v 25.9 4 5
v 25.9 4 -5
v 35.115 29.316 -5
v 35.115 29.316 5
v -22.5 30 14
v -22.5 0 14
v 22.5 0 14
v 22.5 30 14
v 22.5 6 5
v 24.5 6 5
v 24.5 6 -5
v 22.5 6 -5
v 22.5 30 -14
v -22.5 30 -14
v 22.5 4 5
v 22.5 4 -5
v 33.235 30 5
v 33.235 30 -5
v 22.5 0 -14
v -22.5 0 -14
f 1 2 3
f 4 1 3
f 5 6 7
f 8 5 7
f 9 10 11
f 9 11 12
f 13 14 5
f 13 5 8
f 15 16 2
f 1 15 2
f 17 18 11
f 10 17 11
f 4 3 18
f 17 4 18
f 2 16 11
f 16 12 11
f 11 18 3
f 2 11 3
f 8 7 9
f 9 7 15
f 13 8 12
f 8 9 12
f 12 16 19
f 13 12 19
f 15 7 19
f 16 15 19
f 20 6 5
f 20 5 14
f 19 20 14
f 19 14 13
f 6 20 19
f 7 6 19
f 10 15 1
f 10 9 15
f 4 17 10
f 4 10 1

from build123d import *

# Parameters (mm, degrees)
SKETCH1_W                = 45
SKETCH1_H                = 28
BOSS_EXTRUDE1_DEPTH      = 30
BOSS_EXTRUDE2_DEPTH      = 5
BOSS_EXTRUDE2_DEPTH_BACK = 5


with BuildPart() as part:
    # Sketch1 → Boss-Extrude1 (new body)
    with BuildSketch(Plane(origin=(0, 0, 0), x_dir=(1, 0, 0), z_dir=(0, 1, 0))):
        Rectangle(SKETCH1_W, SKETCH1_H)
    extrude(amount=BOSS_EXTRUDE1_DEPTH)

    # Sketch2 → Boss-Extrude2 (add, two sides: drawn at the far end of the back side and taken through both)
    with BuildSketch(Plane.XY.offset(-BOSS_EXTRUDE2_DEPTH_BACK)):
        Polygon((22.5, 4), (25.900415076, 4), (35.114670864, 29.315959713), (33.235285622, 30), (24.5, 6), (22.5, 6), align=None)
    extrude(amount=BOSS_EXTRUDE2_DEPTH + BOSS_EXTRUDE2_DEPTH_BACK)


solid = part.part
